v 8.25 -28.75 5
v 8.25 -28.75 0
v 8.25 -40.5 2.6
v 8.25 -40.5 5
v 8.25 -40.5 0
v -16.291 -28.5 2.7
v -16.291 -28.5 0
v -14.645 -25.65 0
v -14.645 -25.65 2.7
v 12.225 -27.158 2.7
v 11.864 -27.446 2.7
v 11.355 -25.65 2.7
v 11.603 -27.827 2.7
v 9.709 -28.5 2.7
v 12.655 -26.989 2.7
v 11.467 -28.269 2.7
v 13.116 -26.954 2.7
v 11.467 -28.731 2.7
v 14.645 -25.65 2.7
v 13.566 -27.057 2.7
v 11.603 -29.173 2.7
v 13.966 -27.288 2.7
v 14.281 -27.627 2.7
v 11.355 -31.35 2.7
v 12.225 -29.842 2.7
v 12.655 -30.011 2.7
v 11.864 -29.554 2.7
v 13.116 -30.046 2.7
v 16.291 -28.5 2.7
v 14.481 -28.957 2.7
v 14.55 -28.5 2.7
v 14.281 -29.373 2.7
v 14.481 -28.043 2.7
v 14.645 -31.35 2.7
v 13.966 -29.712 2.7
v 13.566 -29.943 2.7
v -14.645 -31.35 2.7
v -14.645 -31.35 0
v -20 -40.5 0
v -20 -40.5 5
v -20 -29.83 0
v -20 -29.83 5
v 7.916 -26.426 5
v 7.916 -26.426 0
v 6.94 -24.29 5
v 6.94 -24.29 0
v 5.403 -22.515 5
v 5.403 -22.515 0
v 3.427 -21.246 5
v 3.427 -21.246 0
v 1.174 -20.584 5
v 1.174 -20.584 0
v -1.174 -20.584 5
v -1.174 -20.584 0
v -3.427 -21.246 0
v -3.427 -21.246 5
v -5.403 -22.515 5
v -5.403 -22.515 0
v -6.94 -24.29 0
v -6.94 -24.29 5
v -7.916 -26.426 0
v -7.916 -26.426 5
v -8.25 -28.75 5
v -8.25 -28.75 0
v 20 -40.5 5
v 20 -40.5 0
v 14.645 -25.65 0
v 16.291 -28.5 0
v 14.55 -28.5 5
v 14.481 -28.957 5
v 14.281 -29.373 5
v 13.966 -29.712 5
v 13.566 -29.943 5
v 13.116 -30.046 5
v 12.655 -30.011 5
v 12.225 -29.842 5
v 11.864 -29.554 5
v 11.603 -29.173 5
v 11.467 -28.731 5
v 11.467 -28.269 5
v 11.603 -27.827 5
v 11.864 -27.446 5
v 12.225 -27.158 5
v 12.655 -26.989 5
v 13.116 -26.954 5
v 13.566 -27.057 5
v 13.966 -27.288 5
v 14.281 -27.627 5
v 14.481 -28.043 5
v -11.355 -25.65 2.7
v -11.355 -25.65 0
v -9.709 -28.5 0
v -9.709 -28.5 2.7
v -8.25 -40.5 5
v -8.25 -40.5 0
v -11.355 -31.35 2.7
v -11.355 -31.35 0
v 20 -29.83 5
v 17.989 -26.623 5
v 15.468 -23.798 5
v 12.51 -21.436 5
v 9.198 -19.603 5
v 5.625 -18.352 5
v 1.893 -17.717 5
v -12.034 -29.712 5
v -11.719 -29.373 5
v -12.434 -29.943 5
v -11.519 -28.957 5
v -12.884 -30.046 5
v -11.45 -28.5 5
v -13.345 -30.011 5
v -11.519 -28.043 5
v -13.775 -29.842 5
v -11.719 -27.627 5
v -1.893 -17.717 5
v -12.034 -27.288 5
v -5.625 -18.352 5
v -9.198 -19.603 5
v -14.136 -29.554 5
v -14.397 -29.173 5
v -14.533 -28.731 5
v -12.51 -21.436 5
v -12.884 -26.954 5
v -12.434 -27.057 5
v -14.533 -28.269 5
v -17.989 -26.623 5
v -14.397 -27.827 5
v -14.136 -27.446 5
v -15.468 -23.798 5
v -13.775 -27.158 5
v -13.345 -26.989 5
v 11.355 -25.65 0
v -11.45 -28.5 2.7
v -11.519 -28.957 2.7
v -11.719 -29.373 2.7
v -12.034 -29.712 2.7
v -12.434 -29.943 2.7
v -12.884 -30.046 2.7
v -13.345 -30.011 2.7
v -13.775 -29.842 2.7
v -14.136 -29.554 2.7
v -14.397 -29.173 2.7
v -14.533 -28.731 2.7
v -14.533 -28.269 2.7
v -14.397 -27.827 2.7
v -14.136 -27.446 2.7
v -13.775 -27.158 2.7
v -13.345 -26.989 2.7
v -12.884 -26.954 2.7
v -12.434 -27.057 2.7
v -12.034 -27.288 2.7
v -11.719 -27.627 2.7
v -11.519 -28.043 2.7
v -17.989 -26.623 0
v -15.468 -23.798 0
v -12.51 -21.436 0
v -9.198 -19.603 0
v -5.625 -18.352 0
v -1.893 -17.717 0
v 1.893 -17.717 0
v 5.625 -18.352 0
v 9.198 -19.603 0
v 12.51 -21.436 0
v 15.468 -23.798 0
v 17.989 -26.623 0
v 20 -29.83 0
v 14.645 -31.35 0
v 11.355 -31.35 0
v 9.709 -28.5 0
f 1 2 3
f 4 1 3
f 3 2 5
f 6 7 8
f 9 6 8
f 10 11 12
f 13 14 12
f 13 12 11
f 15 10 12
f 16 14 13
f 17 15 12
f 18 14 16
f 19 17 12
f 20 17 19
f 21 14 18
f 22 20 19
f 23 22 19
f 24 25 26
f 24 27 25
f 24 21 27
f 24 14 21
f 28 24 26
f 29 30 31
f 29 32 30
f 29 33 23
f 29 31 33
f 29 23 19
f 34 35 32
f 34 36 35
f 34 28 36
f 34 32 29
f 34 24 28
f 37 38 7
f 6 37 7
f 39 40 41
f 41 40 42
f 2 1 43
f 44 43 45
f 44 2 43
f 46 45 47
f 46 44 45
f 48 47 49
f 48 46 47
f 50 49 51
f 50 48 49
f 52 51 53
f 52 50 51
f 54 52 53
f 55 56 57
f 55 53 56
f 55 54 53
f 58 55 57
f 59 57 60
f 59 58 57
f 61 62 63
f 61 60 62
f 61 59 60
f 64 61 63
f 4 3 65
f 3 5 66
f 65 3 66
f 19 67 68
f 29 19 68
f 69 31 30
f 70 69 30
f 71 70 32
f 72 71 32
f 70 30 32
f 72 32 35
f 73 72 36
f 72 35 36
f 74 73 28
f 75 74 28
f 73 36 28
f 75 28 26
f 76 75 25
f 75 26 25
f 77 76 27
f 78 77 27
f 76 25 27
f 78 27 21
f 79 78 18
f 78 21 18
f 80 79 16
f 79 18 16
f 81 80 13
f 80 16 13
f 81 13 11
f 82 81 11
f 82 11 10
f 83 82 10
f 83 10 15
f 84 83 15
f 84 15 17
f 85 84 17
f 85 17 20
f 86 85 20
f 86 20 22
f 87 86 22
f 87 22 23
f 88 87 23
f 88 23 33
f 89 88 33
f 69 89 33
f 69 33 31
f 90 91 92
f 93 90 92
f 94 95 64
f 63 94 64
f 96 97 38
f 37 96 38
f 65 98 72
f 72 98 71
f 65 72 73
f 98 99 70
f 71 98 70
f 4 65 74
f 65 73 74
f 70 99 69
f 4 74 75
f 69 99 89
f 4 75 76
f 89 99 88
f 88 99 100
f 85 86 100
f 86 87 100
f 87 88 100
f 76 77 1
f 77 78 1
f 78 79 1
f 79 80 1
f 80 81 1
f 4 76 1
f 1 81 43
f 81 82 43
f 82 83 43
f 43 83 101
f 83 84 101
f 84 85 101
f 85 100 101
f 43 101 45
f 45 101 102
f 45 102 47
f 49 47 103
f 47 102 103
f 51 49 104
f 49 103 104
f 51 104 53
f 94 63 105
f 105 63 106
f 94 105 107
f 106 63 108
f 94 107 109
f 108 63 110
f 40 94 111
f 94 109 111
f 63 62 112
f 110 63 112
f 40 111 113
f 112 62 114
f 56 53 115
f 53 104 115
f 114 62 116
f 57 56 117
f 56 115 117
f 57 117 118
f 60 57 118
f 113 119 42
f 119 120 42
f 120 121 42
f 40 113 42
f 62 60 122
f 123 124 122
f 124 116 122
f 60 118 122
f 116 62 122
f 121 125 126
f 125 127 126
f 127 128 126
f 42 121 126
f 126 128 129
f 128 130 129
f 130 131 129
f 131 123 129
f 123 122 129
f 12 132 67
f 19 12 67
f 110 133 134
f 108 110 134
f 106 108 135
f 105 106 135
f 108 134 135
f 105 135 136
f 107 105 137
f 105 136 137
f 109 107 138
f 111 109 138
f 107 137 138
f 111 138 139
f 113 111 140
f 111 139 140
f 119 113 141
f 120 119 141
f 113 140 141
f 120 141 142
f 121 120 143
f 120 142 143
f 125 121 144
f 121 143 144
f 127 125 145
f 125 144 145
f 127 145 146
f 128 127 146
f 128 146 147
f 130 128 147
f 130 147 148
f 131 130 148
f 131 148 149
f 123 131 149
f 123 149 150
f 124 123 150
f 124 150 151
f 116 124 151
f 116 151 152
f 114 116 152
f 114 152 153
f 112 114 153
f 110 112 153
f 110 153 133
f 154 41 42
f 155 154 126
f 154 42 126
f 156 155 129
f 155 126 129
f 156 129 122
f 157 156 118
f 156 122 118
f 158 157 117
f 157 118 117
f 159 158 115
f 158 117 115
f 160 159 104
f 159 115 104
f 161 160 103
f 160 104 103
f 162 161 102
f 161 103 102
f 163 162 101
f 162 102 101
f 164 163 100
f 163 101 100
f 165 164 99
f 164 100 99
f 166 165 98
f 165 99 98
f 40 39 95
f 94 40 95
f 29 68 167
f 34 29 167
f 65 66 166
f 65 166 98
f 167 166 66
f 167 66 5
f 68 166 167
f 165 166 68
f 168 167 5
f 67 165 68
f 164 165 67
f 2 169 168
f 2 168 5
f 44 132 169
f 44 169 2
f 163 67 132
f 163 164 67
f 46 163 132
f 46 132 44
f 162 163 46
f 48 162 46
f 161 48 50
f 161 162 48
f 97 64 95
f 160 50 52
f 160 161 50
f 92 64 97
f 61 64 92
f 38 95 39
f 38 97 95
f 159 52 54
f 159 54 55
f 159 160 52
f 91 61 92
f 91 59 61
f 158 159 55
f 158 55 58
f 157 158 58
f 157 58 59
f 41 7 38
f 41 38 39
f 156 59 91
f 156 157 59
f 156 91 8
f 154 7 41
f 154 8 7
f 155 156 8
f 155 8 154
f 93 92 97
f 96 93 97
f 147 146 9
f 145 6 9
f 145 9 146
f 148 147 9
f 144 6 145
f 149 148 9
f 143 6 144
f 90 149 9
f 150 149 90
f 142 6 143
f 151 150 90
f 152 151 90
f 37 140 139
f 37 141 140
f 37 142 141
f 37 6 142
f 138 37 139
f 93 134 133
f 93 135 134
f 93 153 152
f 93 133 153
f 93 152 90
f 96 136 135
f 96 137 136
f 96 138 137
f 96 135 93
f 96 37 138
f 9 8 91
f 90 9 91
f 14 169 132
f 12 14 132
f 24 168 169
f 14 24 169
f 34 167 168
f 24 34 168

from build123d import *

# Parameters (mm, degrees)
F0_R         = 2.6
F0_R_2       = 2
F0_W         = 7
F0_H         = 10
F1_DEPTH     = 8
F2_DEPTH     = 2.6
F0_R_3       = 6
F3_DEPTH     = 25
F4_R         = 1.65
F5_DEPTH     = 50
F6_DEPTH     = 5
F7_DEPTH     = 2
F9_DEPTH     = 2.6
F10_W        = 6.9695419073
F10_H        = 5.4
F11_DEPTH    = 2.15
F12_R        = 1.65
F13_DEPTH    = 25
F14_R        = 1.55
F15_DEPTH    = 2.7
F16_DEPTH    = 25
F17_R        = 6.99999
F18_W        = 16
F18_H        = 35
F19_DEPTH    = 25
F20_W        = 10
F20_H        = 8
F21_DEPTH    = 16
F22_R        = 5
F23_W        = 31
F23_H        = 60
F24_DEPTH    = 4
F25_W        = 31
F25_H        = 10
F26_DEPTH    = 25
F27_R        = 5
F28_T1_DEPTH = 15
F29_T1_DEPTH = 8
F30_W        = 13.0527611077
F30_H        = 9
F31_DEPTH    = 25
F32_T4_DEPTH = 48
F33_W        = 8
F33_H        = 11
F34_DEPTH    = 8
F35_T4_DEPTH = 8
F36_R        = 2
F37_R        = 2
F39_DEPTH    = 25
F40_DEPTH    = 25
F41_DEPTH    = 7
F42_R        = 2
F43_DEPTH    = 11.75
F44_R        = 2
F45_DEPTH    = 11.75
F47_DEPTH    = 3


# Not quite as in the source:
# - a fillet or chamfer that OpenCascade refuses, or shapes differently, is made with other operations: its cross-section is extruded or revolved along the edge and cut away or added
# - a fillet or chamfer is up to 0.001 mm smaller than in the source, because OpenCascade refuses the exact size


with BuildPart() as f1:
    # F0 (on Top) → F1 (new body)
    with BuildSketch(Plane.XY):
        with BuildLine():
            ThreePointArc((6.1, -34.304502678), (0, -20.5), (-6.1, -34.304502678))
            Line((-6.1, -34.304502678), (-6.1, -28.75))
            ThreePointArc((-6.1, -28.75), (0, -22.65), (6.1, -28.75))
            Line((6.1, -28.75), (6.1, -34.304502678))
        make_face()
        with BuildLine():
            Line((27, 42.5), (-27, 42.5))
            Line((-27, 42.5), (-27, -26.5))
            Line((-27, -26.5), (-20, -26.5))
            Line((-20, -26.5), (-20, -42.5))
            Line((-20, -42.5), (-6.1, -42.5))
            Line((-6.1, -42.5), (-6.1, -34.304502678))
            ThreePointArc((-6.1, -34.304502678), (0, -20.5), (6.1, -34.304502678))
            Line((6.1, -34.304502678), (6.1, -42.5))
            Line((6.1, -42.5), (20, -42.5))
            Line((20, -42.5), (20, -16.5))
            Line((20, -16.5), (27, -16.5))
            Line((27, -16.5), (27, 42.5))
        make_face()
        with Locations((-20.4, -6.1)):
            Circle(F0_R, mode=Mode.SUBTRACT)
        with Locations((-12.5, -13)):
            Circle(F0_R_2, mode=Mode.SUBTRACT)
        with BuildLine():
            add(Edge.make_bspline(
                [(7.5, -13), (7.5, -5.2057713659), (-3.75, -9.102885683), (-15, -13), (-3.75, -16.897114317), (7.5, -20.7942286341), (7.5, -13)],
                knots=[0, 0, 0, 2.0943951024, 2.0943951024, 4.1887902048, 4.1887902048, 6.2831853072, 6.2831853072, 6.2831853072], degree=2, weights=[1, 0.5, 1, 0.5, 1, 0.5, 1]))
        make_face(mode=Mode.SUBTRACT)
        with Locations((20.4, -6.1)):
            Circle(F0_R, mode=Mode.SUBTRACT)
        with Locations((-15.5, 12.5)):
            Rectangle(F0_W, F0_H, mode=Mode.SUBTRACT)
        with Locations((-20.4, 30.9)):
            Circle(F0_R, mode=Mode.SUBTRACT)
        with Locations((15.5, 12.5)):
            Rectangle(F0_W, F0_H, mode=Mode.SUBTRACT)
        with Locations((20.4, 30.9)):
            Circle(F0_R, mode=Mode.SUBTRACT)
    extrude(amount=F1_DEPTH)

    # F0 (on Top) → F2 (cut)
    with BuildSketch(Plane.XY):
        with BuildLine():
            ThreePointArc((6.1, -34.304502678), (0, -20.5), (-6.1, -34.304502678))
            Line((-6.1, -34.304502678), (-6.1, -28.75))
            ThreePointArc((-6.1, -28.75), (0, -22.65), (6.1, -28.75))
            Line((6.1, -28.75), (6.1, -34.304502678))
        make_face()
    extrude(amount=F2_DEPTH, mode=Mode.SUBTRACT)

    # F4 (on Right) → F5 (cut, symmetric)
    with BuildSketch(Plane.YZ):
        with Locations((-36.45, 5.5)):
            Circle(F4_R)
    extrude(amount=F5_DEPTH, both=True, mode=Mode.SUBTRACT)

    # F6 (add): a face of the model
    f6_faces = [f1.faces().sort_by_distance(p)[0] for p in [
        (13.05, -42.5, 4),
    ]]
    extrude(f6_faces, amount=F6_DEPTH)

    # F7 (cut): a face of the model
    f7_faces = [f1.faces().sort_by_distance(p)[0] for p in [
        (-13.05, -42.5, 4),
    ]]
    extrude(f7_faces, amount=-F7_DEPTH, mode=Mode.SUBTRACT)

    # F8 (on face) → F9 (cut, through all)
    with BuildSketch(Plane(origin=(0, 0, 0), x_dir=(1, 0, 0), z_dir=(0, 0, -1))):
        with BuildLine():
            ThreePointArc((6.1, 34.304502678), (7.6937474614, 31.7280446605), (8.25, 28.75))
            Line((8.25, 28.75), (8.25, 47.5))
            Line((8.25, 47.5), (6.1, 47.5))
            Line((6.1, 47.5), (6.1, 34.304502678))
        make_face()
        with BuildLine():
            Line((-8.25, 40.5), (-8.25, 28.75))
            ThreePointArc((-8.25, 28.75), (-7.6937474614, 31.7280446605), (-6.1, 34.304502678))
            Line((-6.1, 34.304502678), (-6.1, 40.5))
            Line((-6.1, 40.5), (-8.25, 40.5))
        make_face()
    extrude(amount=-F9_DEPTH, mode=Mode.SUBTRACT)

    # F10 (on face) → F11 (cut, through all)
    with BuildSketch(Plane(origin=(6.1, 0, 0), x_dir=(0, -1, 0), z_dir=(-1, 0, 0))):
        with Locations((44.0152290463, 5.3)):
            Rectangle(F10_W, F10_H)
    extrude(amount=-F11_DEPTH, mode=Mode.SUBTRACT)

    # F12 (on face) → F13 (cut)
    with BuildSketch(Plane(origin=(8.25, 0, 0), x_dir=(0, -1, 0), z_dir=(-1, 0, 0))):
        with Locations((43.8150316477, 4)):
            Circle(F12_R)
    extrude(amount=-F13_DEPTH, mode=Mode.SUBTRACT)

    # F14 (on face) → F15 (cut)
    with BuildSketch(Plane(origin=(0, 0, 0), x_dir=(1, 0, 0), z_dir=(0, 0, -1))):
        Polygon((-14.6454482672, 25.65), (-11.3545517328, 25.65), (-9.7091034656, 28.5), (-11.3545517328, 31.35), (-14.6454482672, 31.35), (-16.2908965344, 28.5), align=None)
        with Locations((-13, 28.5)):
            Circle(F14_R, mode=Mode.SUBTRACT)
        Polygon((11.3545517328, 31.35), (9.7091034656, 28.5), (11.3545517328, 25.65), (14.6454482672, 25.65), (16.2908965344, 28.5), (14.6454482672, 31.35), align=None)
        with Locations((13, 28.5)):
            Circle(F14_R, mode=Mode.SUBTRACT)
    extrude(amount=-F15_DEPTH, mode=Mode.SUBTRACT)

    # F16 (cut): faces of the model
    f16_faces = [f1.faces().sort_by_distance(p)[0] for p in [
        (-13, -28.5, 0),
        (13, -28.5, 0),
    ]]
    extrude(f16_faces, amount=-F16_DEPTH, mode=Mode.SUBTRACT)

    # F17 (radius 7 in the source; OpenCascade refuses exactly that, so slightly less here)
    f17_edges = [f1.edges().sort_by_distance(p)[0] for p in [
        (27, 42.5, 4),
        (-27, 42.5, 4),
        (-27, -26.5, 4),
        (27, -16.5, 4),
    ]]
    fillet(f17_edges, radius=F17_R)

    # F18 (on face) → F19 (cut)
    with BuildSketch(Plane(origin=(0, 0, 0), x_dir=(1, 0, 0), z_dir=(0, 0, -1))):
        with Locations((0, -15)):
            Rectangle(F18_W, F18_H)
    extrude(amount=-F19_DEPTH, mode=Mode.SUBTRACT)

    # F20 (on face) → F21 (join, through all)
    with BuildSketch(Plane.YZ.offset(-8)):
        with Locations((15.5, 4)):
            Rectangle(F20_W, F20_H)
    extrude(amount=F21_DEPTH)

    # F22
    f22_edges = [f1.edges().sort_by_distance(p)[0] for p in [
        (-8, 10.5, 4),
        (-8, -2.5, 4),
        (8, -2.5, 4),
        (8, 10.5, 4),
        (8, 20.5, 4),
        (-8, 20.5, 4),
        (-8, 32.5, 4),
        (8, 32.5, 4),
    ]]
    fillet(f22_edges, radius=F22_R)

    # F23 (on face) → F24 (cut)
    with BuildSketch(Plane(origin=(0, 0, 0), x_dir=(1, 0, 0), z_dir=(0, 0, -1))):
        with Locations((0, -12.5)):
            Rectangle(F23_W, F23_H)
    extrude(amount=-F24_DEPTH, mode=Mode.SUBTRACT)

    # F25 (on face) → F26 (cut)
    with BuildSketch(Plane(origin=(0, 0, 4), x_dir=(1, 0, 0), z_dir=(0, 0, -1))):
        with Locations((0, 12.5)):
            Rectangle(F25_W, F25_H)
    extrude(amount=-F26_DEPTH, mode=Mode.SUBTRACT)

    # F27
    f27_edges = [f1.edges().sort_by_distance(p)[0] for p in [
        (-19, 12.5, 0),
        (19, 12.5, 0),
    ]]
    fillet(f27_edges, radius=F27_R)

    # F28: fillet of radius 5 on 2 edges, made by hand

    # F28_s2 → F28_t1 (join)
    with BuildSketch(Plane.XZ.offset(-7.5)):
        with BuildLine():
            ThreePointArc((-15.5, 0), (-13.7632981746, 2.8729833462), (-10.6010205144, 4))
            Line((-10.6010205144, 4), (-10.6010205144, 4.1))
            Line((-10.6010205144, 4.1), (-15.5, 4.1))
            Line((-15.5, 4.1), (-15.6, 4))
            ThreePointArc((-15.6, 4), (-15.6, 2), (-15.5979795897, 0.02))
            Line((-15.5979795897, 0.02), (-15.5, 0))
        make_face()
        with BuildLine():
            ThreePointArc((15.5, 0), (13.7632981746, 2.8729833462), (10.6010205144, 4))
            Line((10.6010205144, 4), (10.6010205144, 4.1))
            Line((10.6010205144, 4.1), (15.5, 4.1))
            Line((15.5, 4.1), (15.6, 4))
            ThreePointArc((15.6, 4), (15.6, 2), (15.5979795897, 0.02))
            Line((15.5979795897, 0.02), (15.5, 0))
        make_face()
    extrude(amount=F28_T1_DEPTH)

    # F29: fillet of radius 5 on 4 edges, made by hand

    # F29_s2 → F29_t1 (join)
    with BuildSketch(Plane.XY):
        with BuildLine():
            ThreePointArc((-10.5, -7.5), (-14.0355339059, -8.9644660941), (-15.5, -12.5))
            Line((-15.5, -12.5), (-15.5, -7.5))
            Line((-15.5, -7.5), (-10.5, -7.5))
        make_face()
        with BuildLine():
            ThreePointArc((10.5, -7.5), (14.0355339059, -8.9644660941), (15.5, -12.5))
            Line((15.5, -12.5), (15.5, -7.5))
            Line((15.5, -7.5), (10.5, -7.5))
        make_face()
        with BuildLine():
            ThreePointArc((10.5, -17.5), (14.0355339059, -16.0355339059), (15.5, -12.5))
            Line((15.5, -12.5), (15.5, -17.5))
            Line((15.5, -17.5), (10.5, -17.5))
        make_face()
        with BuildLine():
            ThreePointArc((-15.5, -12.5), (-14.0355339059, -16.0355339059), (-10.5, -17.5))
            Line((-10.5, -17.5), (-15.5, -17.5))
            Line((-15.5, -17.5), (-15.5, -12.5))
        make_face()
    extrude(amount=F29_T1_DEPTH)

    # F30 (on face) → F31 (cut)
    with BuildSketch(Plane(origin=(0, 0, 0), x_dir=(1, 0, 0), z_dir=(0, 0, -1))):
        with Locations((-26.5263805538, 22)):
            Rectangle(F30_W, F30_H)
    extrude(amount=-F31_DEPTH, mode=Mode.SUBTRACT)

    # F32: fillet of radius 8 on 1 edges, made by hand


with BuildPart() as f3:
    # F0 (on Top) → F3 (new body)
    with BuildSketch(Plane.XY):
        with Locations((0, -28.75)):
            Circle(F0_R_3)
    extrude(amount=F3_DEPTH)


with BuildPart() as f32_tool2:
    # F32_s3 → F32_t4 (new body)
    with BuildSketch(Plane.XY.offset(-20)):
        with BuildLine():
            ThreePointArc((-19, -17.5), (-24.6568542495, -15.1568542495), (-27, -9.5))
            Line((-27, -9.5), (-27, -17.5))
            Line((-27, -17.5), (-19, -17.5))
        make_face()
    extrude(amount=F32_T4_DEPTH)

    split(bisect_by=Plane.YZ.offset(-20), keep=Keep.BOTTOM)


with BuildPart() as f1_1:
    add(f1.part)

    # F32_t1: cut F32_tool2
    add(f32_tool2.part, mode=Mode.SUBTRACT)

    # F33 (on Top) → F34 (join, through all)
    with BuildSketch(Plane.XY):
        with Locations((-0.022189036, -12.5)):
            Rectangle(F33_W, F33_H)
    extrude(amount=F34_DEPTH)

    # F35: fillet of radius 5 on 1 edges, made by hand


with BuildPart() as f35_tool2:
    # F35_s3 → F35_t4 (new body)
    with BuildSketch(Plane.YZ.offset(3.977810964)):
        with BuildLine():
            ThreePointArc((-12, 0), (-8.4644660941, 1.4644660941), (-7, 5))
            Line((-7, 5), (-6.9, 5))
            Line((-6.9, 5), (-6.9, -0.1))
            Line((-6.9, -0.1), (-12, -0.1))
            Line((-12, -0.1), (-12, 0))
        make_face()
    extrude(amount=-F35_T4_DEPTH)

    split(bisect_by=Plane.XY.offset(4), keep=Keep.BOTTOM)


with BuildPart() as f1_2:
    add(f1_1.part)

    # F35_t1: cut F35_tool2
    add(f35_tool2.part, mode=Mode.SUBTRACT)

    # F36
    f36_edges = [f1_2.edges().sort_by_distance(p)[0] for p in [
        (3.977811, -7.5, 6),
        (-4.022189, -7.5, 6),
    ]]
    fillet(f36_edges, radius=F36_R)

    # F37
    f37_edges = [f1_2.edges().sort_by_distance(p)[0] for p in [
        (3.977811, -17.5, 4),
        (-4.022189, -17.5, 4),
    ]]
    fillet(f37_edges, radius=F37_R)

    # F38 (on face) → F39 (cut)
    with BuildSketch(Plane.XY.offset(8)):
        with BuildLine():
            ThreePointArc((-22.4970808651, -40.5), (0, -17.6375740767), (22.4970808651, -40.5))
            Line((22.4970808651, -40.5), (37.6332104206, -40.5))
            Line((37.6332104206, -40.5), (37.6332104206, 50.0679649413))
            Line((37.6332104206, 50.0679649413), (-32.9294279218, 50.0679649413))
            Line((-32.9294279218, 50.0679649413), (-32.9294279218, -40.5))
            Line((-32.9294279218, -40.5), (-22.4970808651, -40.5))
        make_face()
    extrude(amount=-F39_DEPTH, mode=Mode.SUBTRACT)

    # F40 (cut): a face of the model
    f40_faces = [f1_2.faces().sort_by_distance(p)[0] for p in [
        (-6.3595128612, -34.625, 2.6),
    ]]
    extrude(f40_faces, amount=-F40_DEPTH, mode=Mode.SUBTRACT)

    # F41 (cut, through all): a face of the model
    f41_faces = [f1_2.faces().sort_by_distance(p)[0] for p in [
        (14.125, -47.5, 4),
    ]]
    extrude(f41_faces, amount=-F41_DEPTH, mode=Mode.SUBTRACT)

    # F42 (on face) → F43 (join, through all)
    with BuildSketch(Plane(origin=(-20, 0, 0), x_dir=(0, -1, 0), z_dir=(-1, 0, 0))):
        with Locations((36.45, 5.5)):
            Circle(F42_R)
    extrude(amount=-F43_DEPTH)

    # F44 (on face) → F45 (join, through all)
    with BuildSketch(Plane.YZ.offset(20)):
        with Locations((-36.45, 5.5)):
            Circle(F44_R)
    extrude(amount=-F45_DEPTH)

    # F47 (cut): a face of the model
    f47_faces = [f1_2.faces().sort_by_distance(p)[0] for p in [
        (0, -18.098300733, 8),
    ]]
    extrude(f47_faces, amount=-F47_DEPTH, mode=Mode.SUBTRACT)


solid = f1_2.part
